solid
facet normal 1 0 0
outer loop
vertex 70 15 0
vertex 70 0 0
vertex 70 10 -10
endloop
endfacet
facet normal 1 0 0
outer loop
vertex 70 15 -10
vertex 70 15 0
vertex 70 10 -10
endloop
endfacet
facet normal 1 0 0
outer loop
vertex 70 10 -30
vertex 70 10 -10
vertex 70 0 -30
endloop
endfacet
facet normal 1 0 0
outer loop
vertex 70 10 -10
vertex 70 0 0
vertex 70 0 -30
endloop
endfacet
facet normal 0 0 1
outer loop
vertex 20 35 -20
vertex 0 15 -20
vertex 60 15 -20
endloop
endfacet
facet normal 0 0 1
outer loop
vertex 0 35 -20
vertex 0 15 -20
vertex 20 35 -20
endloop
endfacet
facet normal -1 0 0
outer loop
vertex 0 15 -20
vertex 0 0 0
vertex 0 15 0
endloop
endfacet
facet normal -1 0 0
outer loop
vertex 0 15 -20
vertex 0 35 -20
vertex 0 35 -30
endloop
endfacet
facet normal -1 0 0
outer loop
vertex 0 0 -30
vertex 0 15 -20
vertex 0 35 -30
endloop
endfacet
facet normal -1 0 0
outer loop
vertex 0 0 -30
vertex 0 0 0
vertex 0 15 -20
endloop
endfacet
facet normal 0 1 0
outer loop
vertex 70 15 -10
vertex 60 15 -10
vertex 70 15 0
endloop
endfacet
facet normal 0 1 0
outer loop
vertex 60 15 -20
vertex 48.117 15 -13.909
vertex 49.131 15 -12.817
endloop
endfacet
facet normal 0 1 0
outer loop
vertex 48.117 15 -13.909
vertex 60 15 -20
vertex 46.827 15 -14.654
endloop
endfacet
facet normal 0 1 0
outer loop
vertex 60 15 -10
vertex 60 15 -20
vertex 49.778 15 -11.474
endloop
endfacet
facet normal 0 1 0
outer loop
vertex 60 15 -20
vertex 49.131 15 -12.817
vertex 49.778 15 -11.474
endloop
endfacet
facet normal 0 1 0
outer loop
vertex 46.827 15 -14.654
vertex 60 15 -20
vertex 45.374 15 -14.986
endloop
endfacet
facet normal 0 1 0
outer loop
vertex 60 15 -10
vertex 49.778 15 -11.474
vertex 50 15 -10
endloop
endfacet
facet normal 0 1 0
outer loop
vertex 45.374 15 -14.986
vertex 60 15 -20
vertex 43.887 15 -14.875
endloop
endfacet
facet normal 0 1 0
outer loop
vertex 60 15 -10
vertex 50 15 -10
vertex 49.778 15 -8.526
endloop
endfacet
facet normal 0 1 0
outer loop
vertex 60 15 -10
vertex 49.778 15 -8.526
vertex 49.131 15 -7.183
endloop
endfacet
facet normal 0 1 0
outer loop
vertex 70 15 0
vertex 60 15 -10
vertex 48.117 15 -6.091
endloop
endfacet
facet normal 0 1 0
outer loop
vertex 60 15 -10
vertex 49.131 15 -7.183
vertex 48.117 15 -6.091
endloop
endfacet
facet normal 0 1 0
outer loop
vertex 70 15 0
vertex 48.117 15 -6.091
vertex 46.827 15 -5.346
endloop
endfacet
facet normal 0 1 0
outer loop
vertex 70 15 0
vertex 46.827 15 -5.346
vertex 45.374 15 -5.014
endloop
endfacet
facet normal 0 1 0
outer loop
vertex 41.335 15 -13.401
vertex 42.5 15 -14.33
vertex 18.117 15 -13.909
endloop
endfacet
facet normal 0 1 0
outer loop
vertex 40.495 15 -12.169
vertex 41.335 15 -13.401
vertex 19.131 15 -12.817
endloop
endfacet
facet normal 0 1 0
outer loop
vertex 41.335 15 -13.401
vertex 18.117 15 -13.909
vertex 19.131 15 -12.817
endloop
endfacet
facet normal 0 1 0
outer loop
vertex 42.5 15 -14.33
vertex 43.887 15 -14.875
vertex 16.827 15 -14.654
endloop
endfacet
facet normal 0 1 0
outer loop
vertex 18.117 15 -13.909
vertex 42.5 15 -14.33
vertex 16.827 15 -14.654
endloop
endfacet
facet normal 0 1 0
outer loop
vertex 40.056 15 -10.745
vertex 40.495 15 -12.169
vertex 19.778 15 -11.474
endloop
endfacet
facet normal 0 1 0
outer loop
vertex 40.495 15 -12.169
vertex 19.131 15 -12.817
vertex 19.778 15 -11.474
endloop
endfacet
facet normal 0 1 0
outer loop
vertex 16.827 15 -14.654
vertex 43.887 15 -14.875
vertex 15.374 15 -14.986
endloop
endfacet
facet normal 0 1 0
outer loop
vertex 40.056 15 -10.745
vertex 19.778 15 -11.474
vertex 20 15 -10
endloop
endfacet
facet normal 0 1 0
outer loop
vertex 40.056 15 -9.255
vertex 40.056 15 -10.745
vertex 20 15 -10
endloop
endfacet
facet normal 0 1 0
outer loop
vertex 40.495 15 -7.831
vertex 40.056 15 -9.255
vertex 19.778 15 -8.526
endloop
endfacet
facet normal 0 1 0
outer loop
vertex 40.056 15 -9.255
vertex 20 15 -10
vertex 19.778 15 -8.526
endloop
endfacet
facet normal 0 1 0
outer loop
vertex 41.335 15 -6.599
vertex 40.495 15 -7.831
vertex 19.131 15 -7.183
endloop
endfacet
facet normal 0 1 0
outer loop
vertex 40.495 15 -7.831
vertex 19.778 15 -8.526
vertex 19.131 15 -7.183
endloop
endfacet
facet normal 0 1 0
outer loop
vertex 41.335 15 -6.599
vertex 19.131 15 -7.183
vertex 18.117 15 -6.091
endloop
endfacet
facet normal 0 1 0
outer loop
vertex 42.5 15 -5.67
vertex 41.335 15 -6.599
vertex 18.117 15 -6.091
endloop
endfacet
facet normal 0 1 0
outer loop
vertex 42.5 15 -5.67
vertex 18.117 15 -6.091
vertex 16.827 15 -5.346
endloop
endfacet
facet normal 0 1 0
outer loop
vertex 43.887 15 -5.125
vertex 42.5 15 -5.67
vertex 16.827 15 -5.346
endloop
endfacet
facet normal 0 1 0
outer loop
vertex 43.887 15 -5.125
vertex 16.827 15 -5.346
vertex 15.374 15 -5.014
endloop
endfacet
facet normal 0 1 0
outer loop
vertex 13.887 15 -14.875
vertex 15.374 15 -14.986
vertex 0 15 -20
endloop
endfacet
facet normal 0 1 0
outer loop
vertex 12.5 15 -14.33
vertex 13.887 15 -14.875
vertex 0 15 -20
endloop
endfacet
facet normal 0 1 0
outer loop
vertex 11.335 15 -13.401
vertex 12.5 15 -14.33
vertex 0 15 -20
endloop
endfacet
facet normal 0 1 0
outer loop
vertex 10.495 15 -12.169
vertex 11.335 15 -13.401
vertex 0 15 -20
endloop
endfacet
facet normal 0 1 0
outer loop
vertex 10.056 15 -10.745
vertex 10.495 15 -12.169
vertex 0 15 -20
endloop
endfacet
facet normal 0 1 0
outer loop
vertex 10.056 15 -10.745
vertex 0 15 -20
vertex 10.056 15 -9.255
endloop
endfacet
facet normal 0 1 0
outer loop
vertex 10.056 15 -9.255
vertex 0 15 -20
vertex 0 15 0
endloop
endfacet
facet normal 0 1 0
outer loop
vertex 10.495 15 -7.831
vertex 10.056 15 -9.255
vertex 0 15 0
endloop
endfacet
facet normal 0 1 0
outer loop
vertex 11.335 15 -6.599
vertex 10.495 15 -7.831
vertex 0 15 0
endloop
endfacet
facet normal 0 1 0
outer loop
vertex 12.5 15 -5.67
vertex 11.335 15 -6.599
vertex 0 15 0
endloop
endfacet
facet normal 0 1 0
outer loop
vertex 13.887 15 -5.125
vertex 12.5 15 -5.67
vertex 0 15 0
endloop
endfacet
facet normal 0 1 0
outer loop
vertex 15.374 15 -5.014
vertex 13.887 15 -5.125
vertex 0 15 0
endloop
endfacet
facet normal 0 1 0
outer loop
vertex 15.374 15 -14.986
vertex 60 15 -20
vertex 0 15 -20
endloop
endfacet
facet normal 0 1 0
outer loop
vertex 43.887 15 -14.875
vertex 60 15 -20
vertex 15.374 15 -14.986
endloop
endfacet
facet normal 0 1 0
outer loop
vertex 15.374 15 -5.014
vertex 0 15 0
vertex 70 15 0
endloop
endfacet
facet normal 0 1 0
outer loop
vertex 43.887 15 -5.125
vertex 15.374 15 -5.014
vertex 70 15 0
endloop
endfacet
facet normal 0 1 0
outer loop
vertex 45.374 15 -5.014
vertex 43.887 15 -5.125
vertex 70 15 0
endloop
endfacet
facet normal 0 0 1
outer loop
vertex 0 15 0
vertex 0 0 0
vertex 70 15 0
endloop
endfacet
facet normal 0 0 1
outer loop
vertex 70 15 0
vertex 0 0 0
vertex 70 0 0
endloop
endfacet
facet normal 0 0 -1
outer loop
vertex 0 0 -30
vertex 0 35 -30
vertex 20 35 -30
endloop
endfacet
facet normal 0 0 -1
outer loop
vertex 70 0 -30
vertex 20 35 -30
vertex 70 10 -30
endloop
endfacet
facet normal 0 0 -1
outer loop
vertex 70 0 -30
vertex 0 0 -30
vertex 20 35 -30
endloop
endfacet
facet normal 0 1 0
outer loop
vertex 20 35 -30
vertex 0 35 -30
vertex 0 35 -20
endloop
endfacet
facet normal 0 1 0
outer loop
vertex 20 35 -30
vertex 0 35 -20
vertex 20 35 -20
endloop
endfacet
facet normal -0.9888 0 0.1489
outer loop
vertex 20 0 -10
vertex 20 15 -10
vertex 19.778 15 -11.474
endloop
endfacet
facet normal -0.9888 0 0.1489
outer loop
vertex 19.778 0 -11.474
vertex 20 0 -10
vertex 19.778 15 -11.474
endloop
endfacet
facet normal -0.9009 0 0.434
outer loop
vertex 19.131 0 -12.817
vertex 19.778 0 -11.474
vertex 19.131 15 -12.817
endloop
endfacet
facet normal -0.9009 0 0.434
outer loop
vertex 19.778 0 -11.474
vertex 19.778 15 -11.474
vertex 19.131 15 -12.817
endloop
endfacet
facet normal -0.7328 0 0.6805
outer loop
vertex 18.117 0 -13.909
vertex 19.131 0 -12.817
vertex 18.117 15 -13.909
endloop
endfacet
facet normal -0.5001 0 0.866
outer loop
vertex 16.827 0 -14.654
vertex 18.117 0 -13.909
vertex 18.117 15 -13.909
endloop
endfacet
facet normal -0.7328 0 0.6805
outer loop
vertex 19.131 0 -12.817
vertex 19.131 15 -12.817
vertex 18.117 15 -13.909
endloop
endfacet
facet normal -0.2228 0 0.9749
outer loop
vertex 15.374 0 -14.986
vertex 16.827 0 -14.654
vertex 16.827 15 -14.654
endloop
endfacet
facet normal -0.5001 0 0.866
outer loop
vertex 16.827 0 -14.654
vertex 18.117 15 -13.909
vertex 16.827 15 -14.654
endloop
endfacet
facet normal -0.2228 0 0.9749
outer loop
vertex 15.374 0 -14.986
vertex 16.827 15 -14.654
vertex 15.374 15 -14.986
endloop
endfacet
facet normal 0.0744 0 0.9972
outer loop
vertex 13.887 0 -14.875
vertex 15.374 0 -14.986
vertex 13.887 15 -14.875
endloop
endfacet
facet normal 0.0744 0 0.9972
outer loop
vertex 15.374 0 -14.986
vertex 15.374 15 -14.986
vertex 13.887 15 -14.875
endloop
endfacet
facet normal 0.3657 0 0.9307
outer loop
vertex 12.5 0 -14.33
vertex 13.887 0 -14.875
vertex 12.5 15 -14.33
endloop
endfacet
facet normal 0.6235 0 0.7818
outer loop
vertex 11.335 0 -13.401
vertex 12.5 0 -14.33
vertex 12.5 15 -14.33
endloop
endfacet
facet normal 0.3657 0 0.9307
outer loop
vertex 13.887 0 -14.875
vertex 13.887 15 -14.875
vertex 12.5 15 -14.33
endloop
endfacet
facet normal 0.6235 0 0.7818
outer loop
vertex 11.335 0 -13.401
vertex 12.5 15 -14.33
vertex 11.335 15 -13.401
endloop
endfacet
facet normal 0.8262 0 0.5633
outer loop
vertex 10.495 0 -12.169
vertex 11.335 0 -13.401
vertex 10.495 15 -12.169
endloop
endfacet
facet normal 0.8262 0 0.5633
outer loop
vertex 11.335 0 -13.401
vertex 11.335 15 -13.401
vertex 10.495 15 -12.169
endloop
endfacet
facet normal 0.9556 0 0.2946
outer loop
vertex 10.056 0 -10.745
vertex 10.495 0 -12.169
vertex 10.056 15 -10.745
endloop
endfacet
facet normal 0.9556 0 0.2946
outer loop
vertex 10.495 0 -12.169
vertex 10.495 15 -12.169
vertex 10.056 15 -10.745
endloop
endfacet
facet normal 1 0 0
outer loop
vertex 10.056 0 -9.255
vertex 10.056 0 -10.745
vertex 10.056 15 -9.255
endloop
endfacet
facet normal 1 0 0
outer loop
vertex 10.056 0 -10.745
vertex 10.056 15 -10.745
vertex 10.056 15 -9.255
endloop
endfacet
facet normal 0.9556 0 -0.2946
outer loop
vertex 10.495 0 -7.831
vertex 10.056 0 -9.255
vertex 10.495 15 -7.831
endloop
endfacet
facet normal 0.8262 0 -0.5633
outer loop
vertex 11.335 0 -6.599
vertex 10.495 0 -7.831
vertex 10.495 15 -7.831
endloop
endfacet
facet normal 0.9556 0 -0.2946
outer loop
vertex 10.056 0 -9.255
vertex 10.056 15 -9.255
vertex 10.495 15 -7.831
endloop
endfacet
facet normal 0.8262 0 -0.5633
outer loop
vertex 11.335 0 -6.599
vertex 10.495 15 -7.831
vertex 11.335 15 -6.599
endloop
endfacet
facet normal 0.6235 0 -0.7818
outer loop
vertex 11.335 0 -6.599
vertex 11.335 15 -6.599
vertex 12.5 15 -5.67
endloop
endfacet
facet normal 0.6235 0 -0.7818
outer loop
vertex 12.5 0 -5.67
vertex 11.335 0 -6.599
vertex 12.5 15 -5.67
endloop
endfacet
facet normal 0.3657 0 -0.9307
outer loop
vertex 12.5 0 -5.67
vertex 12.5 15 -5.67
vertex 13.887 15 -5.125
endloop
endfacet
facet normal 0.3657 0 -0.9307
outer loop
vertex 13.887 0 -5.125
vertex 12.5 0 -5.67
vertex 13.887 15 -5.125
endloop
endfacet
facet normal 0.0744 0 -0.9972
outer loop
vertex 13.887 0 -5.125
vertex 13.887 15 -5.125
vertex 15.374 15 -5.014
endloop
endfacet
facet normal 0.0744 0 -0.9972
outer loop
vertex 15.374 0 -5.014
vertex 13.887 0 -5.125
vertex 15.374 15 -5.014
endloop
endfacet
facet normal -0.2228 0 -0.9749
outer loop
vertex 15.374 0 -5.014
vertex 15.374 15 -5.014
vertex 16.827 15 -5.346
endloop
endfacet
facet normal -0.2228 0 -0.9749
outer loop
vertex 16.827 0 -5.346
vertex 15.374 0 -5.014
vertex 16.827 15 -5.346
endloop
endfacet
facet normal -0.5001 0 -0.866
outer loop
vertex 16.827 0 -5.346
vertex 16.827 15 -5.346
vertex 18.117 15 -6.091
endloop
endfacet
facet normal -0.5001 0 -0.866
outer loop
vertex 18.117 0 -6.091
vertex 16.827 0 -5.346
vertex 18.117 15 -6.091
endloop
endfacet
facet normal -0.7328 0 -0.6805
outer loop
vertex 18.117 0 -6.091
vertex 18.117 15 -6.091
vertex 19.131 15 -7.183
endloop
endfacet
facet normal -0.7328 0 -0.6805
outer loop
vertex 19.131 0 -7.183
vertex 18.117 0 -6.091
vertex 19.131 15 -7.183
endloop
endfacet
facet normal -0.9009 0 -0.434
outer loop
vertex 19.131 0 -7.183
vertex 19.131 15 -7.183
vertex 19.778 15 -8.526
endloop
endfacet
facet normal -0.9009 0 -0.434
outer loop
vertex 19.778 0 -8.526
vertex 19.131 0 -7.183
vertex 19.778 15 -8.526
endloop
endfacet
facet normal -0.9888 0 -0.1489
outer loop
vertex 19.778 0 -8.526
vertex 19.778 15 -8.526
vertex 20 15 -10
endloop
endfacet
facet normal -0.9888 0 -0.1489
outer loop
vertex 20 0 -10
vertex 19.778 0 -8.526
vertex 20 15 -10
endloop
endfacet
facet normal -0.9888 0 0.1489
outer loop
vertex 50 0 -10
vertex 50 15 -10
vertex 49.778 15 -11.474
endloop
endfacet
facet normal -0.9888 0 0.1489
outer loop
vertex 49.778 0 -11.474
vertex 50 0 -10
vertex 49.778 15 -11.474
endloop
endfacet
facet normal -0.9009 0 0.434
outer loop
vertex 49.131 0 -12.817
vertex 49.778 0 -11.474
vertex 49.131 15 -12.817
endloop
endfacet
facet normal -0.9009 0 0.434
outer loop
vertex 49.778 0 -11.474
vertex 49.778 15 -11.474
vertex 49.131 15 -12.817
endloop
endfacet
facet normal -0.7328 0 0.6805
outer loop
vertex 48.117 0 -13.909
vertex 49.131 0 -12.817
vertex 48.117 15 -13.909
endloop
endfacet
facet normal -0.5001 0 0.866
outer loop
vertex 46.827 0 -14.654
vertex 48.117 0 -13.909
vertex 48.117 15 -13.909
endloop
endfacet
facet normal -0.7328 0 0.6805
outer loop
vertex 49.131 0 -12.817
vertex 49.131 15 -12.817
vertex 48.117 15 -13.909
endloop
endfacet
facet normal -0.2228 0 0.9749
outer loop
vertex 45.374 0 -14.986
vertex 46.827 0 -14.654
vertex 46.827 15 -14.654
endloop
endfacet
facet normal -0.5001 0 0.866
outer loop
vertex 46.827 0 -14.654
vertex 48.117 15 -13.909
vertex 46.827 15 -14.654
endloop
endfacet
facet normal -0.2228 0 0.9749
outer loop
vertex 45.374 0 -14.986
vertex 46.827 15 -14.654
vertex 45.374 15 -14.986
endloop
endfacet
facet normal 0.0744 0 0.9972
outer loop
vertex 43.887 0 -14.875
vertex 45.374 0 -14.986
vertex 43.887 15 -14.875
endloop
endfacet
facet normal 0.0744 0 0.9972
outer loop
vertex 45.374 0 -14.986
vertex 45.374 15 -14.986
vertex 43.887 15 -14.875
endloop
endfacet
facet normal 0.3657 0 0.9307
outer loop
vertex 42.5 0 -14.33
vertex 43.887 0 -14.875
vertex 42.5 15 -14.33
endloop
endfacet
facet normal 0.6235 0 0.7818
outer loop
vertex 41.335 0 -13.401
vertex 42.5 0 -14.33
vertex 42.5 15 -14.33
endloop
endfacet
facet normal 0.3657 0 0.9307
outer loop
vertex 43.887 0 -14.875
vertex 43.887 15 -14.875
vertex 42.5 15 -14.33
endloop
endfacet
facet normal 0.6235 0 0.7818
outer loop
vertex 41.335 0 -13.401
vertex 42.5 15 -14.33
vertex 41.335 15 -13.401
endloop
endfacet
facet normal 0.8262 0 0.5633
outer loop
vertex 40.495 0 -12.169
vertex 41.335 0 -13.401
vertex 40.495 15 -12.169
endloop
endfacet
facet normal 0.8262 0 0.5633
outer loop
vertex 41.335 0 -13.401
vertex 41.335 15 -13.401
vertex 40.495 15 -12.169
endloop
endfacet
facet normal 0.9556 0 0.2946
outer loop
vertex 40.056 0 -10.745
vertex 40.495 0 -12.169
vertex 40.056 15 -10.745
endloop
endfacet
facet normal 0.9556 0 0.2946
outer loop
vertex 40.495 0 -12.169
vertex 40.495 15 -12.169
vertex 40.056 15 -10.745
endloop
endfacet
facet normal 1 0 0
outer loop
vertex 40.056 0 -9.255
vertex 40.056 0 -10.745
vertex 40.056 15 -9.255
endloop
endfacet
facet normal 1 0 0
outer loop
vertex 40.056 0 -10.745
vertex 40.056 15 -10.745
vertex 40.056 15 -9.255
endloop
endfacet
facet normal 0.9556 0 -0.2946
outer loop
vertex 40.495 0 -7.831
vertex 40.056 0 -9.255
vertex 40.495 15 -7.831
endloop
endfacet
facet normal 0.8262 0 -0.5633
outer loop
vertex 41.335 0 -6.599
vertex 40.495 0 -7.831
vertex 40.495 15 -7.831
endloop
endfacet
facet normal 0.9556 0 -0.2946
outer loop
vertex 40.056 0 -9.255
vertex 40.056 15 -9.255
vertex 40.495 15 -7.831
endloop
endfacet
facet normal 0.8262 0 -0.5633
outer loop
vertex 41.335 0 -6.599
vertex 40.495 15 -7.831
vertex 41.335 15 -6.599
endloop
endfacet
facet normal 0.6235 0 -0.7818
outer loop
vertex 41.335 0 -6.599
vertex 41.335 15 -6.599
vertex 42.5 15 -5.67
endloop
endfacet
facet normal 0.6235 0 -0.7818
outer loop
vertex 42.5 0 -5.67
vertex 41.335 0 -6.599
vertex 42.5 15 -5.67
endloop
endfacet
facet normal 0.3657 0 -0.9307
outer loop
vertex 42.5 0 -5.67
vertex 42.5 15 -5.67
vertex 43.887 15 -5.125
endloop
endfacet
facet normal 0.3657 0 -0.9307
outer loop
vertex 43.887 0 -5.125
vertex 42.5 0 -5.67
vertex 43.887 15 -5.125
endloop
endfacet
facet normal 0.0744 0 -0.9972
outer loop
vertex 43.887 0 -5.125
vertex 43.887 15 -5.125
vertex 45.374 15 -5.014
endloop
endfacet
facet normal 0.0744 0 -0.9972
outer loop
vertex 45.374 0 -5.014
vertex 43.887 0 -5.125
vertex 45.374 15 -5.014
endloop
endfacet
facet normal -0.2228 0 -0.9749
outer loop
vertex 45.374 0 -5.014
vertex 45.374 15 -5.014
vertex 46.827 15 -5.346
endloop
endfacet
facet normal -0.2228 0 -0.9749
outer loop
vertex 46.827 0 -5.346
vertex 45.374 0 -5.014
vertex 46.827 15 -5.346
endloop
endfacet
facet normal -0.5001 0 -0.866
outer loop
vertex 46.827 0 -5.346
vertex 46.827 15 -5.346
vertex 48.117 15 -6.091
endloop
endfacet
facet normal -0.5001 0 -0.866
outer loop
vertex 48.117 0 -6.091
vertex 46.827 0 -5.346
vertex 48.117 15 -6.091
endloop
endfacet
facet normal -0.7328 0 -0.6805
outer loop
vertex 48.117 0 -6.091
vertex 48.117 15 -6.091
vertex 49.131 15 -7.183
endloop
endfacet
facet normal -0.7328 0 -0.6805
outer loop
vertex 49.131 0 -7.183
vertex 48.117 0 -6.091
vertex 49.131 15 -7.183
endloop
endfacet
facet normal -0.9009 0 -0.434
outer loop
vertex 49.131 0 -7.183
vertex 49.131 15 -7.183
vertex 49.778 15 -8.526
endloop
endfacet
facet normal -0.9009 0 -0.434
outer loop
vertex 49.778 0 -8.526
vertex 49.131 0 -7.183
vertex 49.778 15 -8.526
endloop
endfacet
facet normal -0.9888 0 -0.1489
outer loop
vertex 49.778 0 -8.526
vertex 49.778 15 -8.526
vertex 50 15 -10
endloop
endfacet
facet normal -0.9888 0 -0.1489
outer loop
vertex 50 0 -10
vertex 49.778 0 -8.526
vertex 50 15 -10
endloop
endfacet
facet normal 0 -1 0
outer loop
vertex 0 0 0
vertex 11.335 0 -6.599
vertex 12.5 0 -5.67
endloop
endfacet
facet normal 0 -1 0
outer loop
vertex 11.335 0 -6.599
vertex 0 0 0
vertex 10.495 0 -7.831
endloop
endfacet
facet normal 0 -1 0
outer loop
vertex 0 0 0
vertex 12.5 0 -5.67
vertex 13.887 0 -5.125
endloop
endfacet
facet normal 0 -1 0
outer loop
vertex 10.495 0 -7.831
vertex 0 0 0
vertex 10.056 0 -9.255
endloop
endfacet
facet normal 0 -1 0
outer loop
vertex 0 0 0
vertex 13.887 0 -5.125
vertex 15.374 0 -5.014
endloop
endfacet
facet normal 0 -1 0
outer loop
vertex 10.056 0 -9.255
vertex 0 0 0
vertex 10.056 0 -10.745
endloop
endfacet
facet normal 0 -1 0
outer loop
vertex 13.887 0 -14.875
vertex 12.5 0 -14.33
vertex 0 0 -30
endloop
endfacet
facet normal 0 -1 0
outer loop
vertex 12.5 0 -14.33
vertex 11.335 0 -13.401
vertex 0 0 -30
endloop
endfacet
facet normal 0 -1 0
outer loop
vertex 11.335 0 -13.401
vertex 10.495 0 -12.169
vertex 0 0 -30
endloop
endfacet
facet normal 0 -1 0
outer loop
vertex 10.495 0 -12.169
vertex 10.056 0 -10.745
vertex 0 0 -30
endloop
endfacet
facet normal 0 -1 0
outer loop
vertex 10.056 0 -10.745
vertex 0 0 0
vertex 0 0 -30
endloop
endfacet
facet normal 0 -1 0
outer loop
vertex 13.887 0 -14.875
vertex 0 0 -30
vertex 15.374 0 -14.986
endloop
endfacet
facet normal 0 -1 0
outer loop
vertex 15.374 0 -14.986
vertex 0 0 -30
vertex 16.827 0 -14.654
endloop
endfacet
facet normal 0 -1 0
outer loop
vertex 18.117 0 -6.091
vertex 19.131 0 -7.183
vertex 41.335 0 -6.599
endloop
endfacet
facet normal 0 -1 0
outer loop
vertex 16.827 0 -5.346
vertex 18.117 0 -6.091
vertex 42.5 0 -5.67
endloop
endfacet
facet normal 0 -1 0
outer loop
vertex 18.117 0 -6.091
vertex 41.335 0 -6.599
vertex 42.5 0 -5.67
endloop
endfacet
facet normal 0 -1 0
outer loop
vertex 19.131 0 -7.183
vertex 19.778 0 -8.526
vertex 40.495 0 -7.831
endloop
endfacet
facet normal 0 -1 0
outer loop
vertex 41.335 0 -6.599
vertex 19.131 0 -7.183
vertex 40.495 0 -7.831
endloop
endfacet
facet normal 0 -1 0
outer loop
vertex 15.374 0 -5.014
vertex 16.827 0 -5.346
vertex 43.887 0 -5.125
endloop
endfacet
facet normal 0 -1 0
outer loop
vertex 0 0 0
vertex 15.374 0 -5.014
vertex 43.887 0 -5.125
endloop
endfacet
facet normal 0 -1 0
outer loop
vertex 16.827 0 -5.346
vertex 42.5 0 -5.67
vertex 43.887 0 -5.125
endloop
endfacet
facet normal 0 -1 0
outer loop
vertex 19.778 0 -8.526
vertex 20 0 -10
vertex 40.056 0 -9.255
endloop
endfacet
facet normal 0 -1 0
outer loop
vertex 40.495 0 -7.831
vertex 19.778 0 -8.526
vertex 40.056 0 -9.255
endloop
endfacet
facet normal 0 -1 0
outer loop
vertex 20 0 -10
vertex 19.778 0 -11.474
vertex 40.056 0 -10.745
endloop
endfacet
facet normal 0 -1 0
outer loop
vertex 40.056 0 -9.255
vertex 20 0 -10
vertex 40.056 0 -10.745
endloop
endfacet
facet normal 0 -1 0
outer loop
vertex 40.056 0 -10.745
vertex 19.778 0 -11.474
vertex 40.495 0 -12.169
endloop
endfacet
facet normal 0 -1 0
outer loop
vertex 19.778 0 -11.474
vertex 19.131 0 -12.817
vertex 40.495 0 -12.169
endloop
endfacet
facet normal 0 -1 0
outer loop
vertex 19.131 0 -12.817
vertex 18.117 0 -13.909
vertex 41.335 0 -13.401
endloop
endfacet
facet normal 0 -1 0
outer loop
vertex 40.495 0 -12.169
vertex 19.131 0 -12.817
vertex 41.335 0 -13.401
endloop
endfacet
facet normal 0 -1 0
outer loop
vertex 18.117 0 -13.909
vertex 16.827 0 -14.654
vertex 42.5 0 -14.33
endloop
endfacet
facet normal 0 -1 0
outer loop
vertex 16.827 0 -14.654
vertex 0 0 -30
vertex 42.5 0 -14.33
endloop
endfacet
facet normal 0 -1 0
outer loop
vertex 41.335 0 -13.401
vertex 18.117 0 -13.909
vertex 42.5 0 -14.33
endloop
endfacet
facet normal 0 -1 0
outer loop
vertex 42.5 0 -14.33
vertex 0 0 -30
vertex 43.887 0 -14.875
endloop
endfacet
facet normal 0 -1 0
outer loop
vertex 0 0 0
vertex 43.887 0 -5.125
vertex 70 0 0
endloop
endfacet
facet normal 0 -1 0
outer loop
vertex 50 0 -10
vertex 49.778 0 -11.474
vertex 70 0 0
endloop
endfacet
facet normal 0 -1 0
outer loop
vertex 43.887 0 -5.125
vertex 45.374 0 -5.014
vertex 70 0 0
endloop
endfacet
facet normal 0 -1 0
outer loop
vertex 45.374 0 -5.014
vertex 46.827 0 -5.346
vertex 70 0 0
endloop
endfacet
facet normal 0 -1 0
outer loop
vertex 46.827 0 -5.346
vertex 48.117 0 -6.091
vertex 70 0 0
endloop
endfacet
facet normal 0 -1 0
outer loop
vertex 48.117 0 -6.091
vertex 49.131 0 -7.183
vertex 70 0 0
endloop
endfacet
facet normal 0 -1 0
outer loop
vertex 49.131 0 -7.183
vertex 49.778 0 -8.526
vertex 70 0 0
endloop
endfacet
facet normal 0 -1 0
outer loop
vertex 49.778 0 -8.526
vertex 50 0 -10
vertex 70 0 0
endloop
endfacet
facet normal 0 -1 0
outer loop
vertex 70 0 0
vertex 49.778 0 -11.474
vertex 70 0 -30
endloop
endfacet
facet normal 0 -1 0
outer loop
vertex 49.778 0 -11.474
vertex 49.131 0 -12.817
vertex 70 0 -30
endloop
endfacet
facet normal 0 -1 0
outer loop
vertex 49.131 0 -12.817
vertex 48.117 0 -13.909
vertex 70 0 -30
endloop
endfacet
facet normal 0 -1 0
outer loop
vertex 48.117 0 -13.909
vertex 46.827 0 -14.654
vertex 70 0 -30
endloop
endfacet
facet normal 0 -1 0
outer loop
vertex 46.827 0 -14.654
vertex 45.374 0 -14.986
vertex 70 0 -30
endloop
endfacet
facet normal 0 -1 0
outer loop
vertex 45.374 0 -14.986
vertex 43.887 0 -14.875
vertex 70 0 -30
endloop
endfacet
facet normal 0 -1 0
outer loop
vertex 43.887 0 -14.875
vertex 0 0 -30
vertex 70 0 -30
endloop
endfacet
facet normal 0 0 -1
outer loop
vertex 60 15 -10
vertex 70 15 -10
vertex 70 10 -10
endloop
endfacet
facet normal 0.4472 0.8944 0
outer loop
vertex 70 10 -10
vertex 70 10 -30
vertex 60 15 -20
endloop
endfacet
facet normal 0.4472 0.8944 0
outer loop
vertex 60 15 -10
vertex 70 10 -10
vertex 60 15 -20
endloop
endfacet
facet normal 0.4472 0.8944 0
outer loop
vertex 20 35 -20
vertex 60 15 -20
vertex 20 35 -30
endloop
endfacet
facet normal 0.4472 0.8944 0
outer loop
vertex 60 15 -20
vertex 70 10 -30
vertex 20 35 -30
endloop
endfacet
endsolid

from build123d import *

# Parameters (mm, degrees)
SKETCH1_W           = 70
SKETCH1_H           = 30
BOSS_EXTRUDE1_DEPTH = 35
CUT_EXTRUDE1_DEPTH  = 20
SKETCH3_W           = 20
SKETCH3_H           = 20
CUT_EXTRUDE2_DEPTH  = 71
SKETCH4_R           = 5
CUT_EXTRUDE3_DEPTH  = 16
SKETCH5_R           = 5
CUT_EXTRUDE4_DEPTH  = 16


with BuildPart() as part:
    # Sketch1 → Boss-Extrude1 (new body)
    with BuildSketch(Plane(origin=(0, 0, 0), x_dir=(1, 0, 0), z_dir=(0, 1, 0))):
        with Locations((35, 15)):
            Rectangle(SKETCH1_W, SKETCH1_H)
    extrude(amount=BOSS_EXTRUDE1_DEPTH)

    # Sketch2 → Cut-Extrude1 (cut)
    with BuildSketch(Plane(origin=(0, 0, -30), x_dir=(-1, 0, 0), z_dir=(0, 0, -1))):
        Polygon((-70, 35), (-70, 10), (-20, 35), align=None)
    extrude(amount=-CUT_EXTRUDE1_DEPTH, mode=Mode.SUBTRACT)

    # Sketch3 → Cut-Extrude2 (cut, through all)
    with BuildSketch(Plane.ZY):
        with Locations((-10, 25)):
            Rectangle(SKETCH3_W, SKETCH3_H)
    extrude(amount=-CUT_EXTRUDE2_DEPTH, mode=Mode.SUBTRACT)

    # Sketch4 → Cut-Extrude3 (cut, through all)
    with BuildSketch(Plane(origin=(0, 15, 0), x_dir=(1, 0, 0), z_dir=(0, 1, 0))):
        with Locations((15, 10)):
            Circle(SKETCH4_R)
    extrude(amount=-CUT_EXTRUDE3_DEPTH, mode=Mode.SUBTRACT)

    # Sketch5 → Cut-Extrude4 (cut, through all)
    with BuildSketch(Plane(origin=(0, 15, 0), x_dir=(1, 0, 0), z_dir=(0, 1, 0))):
        with Locations((45, 10)):
            Circle(SKETCH5_R)
    extrude(amount=-CUT_EXTRUDE4_DEPTH, mode=Mode.SUBTRACT)


solid = part.part
